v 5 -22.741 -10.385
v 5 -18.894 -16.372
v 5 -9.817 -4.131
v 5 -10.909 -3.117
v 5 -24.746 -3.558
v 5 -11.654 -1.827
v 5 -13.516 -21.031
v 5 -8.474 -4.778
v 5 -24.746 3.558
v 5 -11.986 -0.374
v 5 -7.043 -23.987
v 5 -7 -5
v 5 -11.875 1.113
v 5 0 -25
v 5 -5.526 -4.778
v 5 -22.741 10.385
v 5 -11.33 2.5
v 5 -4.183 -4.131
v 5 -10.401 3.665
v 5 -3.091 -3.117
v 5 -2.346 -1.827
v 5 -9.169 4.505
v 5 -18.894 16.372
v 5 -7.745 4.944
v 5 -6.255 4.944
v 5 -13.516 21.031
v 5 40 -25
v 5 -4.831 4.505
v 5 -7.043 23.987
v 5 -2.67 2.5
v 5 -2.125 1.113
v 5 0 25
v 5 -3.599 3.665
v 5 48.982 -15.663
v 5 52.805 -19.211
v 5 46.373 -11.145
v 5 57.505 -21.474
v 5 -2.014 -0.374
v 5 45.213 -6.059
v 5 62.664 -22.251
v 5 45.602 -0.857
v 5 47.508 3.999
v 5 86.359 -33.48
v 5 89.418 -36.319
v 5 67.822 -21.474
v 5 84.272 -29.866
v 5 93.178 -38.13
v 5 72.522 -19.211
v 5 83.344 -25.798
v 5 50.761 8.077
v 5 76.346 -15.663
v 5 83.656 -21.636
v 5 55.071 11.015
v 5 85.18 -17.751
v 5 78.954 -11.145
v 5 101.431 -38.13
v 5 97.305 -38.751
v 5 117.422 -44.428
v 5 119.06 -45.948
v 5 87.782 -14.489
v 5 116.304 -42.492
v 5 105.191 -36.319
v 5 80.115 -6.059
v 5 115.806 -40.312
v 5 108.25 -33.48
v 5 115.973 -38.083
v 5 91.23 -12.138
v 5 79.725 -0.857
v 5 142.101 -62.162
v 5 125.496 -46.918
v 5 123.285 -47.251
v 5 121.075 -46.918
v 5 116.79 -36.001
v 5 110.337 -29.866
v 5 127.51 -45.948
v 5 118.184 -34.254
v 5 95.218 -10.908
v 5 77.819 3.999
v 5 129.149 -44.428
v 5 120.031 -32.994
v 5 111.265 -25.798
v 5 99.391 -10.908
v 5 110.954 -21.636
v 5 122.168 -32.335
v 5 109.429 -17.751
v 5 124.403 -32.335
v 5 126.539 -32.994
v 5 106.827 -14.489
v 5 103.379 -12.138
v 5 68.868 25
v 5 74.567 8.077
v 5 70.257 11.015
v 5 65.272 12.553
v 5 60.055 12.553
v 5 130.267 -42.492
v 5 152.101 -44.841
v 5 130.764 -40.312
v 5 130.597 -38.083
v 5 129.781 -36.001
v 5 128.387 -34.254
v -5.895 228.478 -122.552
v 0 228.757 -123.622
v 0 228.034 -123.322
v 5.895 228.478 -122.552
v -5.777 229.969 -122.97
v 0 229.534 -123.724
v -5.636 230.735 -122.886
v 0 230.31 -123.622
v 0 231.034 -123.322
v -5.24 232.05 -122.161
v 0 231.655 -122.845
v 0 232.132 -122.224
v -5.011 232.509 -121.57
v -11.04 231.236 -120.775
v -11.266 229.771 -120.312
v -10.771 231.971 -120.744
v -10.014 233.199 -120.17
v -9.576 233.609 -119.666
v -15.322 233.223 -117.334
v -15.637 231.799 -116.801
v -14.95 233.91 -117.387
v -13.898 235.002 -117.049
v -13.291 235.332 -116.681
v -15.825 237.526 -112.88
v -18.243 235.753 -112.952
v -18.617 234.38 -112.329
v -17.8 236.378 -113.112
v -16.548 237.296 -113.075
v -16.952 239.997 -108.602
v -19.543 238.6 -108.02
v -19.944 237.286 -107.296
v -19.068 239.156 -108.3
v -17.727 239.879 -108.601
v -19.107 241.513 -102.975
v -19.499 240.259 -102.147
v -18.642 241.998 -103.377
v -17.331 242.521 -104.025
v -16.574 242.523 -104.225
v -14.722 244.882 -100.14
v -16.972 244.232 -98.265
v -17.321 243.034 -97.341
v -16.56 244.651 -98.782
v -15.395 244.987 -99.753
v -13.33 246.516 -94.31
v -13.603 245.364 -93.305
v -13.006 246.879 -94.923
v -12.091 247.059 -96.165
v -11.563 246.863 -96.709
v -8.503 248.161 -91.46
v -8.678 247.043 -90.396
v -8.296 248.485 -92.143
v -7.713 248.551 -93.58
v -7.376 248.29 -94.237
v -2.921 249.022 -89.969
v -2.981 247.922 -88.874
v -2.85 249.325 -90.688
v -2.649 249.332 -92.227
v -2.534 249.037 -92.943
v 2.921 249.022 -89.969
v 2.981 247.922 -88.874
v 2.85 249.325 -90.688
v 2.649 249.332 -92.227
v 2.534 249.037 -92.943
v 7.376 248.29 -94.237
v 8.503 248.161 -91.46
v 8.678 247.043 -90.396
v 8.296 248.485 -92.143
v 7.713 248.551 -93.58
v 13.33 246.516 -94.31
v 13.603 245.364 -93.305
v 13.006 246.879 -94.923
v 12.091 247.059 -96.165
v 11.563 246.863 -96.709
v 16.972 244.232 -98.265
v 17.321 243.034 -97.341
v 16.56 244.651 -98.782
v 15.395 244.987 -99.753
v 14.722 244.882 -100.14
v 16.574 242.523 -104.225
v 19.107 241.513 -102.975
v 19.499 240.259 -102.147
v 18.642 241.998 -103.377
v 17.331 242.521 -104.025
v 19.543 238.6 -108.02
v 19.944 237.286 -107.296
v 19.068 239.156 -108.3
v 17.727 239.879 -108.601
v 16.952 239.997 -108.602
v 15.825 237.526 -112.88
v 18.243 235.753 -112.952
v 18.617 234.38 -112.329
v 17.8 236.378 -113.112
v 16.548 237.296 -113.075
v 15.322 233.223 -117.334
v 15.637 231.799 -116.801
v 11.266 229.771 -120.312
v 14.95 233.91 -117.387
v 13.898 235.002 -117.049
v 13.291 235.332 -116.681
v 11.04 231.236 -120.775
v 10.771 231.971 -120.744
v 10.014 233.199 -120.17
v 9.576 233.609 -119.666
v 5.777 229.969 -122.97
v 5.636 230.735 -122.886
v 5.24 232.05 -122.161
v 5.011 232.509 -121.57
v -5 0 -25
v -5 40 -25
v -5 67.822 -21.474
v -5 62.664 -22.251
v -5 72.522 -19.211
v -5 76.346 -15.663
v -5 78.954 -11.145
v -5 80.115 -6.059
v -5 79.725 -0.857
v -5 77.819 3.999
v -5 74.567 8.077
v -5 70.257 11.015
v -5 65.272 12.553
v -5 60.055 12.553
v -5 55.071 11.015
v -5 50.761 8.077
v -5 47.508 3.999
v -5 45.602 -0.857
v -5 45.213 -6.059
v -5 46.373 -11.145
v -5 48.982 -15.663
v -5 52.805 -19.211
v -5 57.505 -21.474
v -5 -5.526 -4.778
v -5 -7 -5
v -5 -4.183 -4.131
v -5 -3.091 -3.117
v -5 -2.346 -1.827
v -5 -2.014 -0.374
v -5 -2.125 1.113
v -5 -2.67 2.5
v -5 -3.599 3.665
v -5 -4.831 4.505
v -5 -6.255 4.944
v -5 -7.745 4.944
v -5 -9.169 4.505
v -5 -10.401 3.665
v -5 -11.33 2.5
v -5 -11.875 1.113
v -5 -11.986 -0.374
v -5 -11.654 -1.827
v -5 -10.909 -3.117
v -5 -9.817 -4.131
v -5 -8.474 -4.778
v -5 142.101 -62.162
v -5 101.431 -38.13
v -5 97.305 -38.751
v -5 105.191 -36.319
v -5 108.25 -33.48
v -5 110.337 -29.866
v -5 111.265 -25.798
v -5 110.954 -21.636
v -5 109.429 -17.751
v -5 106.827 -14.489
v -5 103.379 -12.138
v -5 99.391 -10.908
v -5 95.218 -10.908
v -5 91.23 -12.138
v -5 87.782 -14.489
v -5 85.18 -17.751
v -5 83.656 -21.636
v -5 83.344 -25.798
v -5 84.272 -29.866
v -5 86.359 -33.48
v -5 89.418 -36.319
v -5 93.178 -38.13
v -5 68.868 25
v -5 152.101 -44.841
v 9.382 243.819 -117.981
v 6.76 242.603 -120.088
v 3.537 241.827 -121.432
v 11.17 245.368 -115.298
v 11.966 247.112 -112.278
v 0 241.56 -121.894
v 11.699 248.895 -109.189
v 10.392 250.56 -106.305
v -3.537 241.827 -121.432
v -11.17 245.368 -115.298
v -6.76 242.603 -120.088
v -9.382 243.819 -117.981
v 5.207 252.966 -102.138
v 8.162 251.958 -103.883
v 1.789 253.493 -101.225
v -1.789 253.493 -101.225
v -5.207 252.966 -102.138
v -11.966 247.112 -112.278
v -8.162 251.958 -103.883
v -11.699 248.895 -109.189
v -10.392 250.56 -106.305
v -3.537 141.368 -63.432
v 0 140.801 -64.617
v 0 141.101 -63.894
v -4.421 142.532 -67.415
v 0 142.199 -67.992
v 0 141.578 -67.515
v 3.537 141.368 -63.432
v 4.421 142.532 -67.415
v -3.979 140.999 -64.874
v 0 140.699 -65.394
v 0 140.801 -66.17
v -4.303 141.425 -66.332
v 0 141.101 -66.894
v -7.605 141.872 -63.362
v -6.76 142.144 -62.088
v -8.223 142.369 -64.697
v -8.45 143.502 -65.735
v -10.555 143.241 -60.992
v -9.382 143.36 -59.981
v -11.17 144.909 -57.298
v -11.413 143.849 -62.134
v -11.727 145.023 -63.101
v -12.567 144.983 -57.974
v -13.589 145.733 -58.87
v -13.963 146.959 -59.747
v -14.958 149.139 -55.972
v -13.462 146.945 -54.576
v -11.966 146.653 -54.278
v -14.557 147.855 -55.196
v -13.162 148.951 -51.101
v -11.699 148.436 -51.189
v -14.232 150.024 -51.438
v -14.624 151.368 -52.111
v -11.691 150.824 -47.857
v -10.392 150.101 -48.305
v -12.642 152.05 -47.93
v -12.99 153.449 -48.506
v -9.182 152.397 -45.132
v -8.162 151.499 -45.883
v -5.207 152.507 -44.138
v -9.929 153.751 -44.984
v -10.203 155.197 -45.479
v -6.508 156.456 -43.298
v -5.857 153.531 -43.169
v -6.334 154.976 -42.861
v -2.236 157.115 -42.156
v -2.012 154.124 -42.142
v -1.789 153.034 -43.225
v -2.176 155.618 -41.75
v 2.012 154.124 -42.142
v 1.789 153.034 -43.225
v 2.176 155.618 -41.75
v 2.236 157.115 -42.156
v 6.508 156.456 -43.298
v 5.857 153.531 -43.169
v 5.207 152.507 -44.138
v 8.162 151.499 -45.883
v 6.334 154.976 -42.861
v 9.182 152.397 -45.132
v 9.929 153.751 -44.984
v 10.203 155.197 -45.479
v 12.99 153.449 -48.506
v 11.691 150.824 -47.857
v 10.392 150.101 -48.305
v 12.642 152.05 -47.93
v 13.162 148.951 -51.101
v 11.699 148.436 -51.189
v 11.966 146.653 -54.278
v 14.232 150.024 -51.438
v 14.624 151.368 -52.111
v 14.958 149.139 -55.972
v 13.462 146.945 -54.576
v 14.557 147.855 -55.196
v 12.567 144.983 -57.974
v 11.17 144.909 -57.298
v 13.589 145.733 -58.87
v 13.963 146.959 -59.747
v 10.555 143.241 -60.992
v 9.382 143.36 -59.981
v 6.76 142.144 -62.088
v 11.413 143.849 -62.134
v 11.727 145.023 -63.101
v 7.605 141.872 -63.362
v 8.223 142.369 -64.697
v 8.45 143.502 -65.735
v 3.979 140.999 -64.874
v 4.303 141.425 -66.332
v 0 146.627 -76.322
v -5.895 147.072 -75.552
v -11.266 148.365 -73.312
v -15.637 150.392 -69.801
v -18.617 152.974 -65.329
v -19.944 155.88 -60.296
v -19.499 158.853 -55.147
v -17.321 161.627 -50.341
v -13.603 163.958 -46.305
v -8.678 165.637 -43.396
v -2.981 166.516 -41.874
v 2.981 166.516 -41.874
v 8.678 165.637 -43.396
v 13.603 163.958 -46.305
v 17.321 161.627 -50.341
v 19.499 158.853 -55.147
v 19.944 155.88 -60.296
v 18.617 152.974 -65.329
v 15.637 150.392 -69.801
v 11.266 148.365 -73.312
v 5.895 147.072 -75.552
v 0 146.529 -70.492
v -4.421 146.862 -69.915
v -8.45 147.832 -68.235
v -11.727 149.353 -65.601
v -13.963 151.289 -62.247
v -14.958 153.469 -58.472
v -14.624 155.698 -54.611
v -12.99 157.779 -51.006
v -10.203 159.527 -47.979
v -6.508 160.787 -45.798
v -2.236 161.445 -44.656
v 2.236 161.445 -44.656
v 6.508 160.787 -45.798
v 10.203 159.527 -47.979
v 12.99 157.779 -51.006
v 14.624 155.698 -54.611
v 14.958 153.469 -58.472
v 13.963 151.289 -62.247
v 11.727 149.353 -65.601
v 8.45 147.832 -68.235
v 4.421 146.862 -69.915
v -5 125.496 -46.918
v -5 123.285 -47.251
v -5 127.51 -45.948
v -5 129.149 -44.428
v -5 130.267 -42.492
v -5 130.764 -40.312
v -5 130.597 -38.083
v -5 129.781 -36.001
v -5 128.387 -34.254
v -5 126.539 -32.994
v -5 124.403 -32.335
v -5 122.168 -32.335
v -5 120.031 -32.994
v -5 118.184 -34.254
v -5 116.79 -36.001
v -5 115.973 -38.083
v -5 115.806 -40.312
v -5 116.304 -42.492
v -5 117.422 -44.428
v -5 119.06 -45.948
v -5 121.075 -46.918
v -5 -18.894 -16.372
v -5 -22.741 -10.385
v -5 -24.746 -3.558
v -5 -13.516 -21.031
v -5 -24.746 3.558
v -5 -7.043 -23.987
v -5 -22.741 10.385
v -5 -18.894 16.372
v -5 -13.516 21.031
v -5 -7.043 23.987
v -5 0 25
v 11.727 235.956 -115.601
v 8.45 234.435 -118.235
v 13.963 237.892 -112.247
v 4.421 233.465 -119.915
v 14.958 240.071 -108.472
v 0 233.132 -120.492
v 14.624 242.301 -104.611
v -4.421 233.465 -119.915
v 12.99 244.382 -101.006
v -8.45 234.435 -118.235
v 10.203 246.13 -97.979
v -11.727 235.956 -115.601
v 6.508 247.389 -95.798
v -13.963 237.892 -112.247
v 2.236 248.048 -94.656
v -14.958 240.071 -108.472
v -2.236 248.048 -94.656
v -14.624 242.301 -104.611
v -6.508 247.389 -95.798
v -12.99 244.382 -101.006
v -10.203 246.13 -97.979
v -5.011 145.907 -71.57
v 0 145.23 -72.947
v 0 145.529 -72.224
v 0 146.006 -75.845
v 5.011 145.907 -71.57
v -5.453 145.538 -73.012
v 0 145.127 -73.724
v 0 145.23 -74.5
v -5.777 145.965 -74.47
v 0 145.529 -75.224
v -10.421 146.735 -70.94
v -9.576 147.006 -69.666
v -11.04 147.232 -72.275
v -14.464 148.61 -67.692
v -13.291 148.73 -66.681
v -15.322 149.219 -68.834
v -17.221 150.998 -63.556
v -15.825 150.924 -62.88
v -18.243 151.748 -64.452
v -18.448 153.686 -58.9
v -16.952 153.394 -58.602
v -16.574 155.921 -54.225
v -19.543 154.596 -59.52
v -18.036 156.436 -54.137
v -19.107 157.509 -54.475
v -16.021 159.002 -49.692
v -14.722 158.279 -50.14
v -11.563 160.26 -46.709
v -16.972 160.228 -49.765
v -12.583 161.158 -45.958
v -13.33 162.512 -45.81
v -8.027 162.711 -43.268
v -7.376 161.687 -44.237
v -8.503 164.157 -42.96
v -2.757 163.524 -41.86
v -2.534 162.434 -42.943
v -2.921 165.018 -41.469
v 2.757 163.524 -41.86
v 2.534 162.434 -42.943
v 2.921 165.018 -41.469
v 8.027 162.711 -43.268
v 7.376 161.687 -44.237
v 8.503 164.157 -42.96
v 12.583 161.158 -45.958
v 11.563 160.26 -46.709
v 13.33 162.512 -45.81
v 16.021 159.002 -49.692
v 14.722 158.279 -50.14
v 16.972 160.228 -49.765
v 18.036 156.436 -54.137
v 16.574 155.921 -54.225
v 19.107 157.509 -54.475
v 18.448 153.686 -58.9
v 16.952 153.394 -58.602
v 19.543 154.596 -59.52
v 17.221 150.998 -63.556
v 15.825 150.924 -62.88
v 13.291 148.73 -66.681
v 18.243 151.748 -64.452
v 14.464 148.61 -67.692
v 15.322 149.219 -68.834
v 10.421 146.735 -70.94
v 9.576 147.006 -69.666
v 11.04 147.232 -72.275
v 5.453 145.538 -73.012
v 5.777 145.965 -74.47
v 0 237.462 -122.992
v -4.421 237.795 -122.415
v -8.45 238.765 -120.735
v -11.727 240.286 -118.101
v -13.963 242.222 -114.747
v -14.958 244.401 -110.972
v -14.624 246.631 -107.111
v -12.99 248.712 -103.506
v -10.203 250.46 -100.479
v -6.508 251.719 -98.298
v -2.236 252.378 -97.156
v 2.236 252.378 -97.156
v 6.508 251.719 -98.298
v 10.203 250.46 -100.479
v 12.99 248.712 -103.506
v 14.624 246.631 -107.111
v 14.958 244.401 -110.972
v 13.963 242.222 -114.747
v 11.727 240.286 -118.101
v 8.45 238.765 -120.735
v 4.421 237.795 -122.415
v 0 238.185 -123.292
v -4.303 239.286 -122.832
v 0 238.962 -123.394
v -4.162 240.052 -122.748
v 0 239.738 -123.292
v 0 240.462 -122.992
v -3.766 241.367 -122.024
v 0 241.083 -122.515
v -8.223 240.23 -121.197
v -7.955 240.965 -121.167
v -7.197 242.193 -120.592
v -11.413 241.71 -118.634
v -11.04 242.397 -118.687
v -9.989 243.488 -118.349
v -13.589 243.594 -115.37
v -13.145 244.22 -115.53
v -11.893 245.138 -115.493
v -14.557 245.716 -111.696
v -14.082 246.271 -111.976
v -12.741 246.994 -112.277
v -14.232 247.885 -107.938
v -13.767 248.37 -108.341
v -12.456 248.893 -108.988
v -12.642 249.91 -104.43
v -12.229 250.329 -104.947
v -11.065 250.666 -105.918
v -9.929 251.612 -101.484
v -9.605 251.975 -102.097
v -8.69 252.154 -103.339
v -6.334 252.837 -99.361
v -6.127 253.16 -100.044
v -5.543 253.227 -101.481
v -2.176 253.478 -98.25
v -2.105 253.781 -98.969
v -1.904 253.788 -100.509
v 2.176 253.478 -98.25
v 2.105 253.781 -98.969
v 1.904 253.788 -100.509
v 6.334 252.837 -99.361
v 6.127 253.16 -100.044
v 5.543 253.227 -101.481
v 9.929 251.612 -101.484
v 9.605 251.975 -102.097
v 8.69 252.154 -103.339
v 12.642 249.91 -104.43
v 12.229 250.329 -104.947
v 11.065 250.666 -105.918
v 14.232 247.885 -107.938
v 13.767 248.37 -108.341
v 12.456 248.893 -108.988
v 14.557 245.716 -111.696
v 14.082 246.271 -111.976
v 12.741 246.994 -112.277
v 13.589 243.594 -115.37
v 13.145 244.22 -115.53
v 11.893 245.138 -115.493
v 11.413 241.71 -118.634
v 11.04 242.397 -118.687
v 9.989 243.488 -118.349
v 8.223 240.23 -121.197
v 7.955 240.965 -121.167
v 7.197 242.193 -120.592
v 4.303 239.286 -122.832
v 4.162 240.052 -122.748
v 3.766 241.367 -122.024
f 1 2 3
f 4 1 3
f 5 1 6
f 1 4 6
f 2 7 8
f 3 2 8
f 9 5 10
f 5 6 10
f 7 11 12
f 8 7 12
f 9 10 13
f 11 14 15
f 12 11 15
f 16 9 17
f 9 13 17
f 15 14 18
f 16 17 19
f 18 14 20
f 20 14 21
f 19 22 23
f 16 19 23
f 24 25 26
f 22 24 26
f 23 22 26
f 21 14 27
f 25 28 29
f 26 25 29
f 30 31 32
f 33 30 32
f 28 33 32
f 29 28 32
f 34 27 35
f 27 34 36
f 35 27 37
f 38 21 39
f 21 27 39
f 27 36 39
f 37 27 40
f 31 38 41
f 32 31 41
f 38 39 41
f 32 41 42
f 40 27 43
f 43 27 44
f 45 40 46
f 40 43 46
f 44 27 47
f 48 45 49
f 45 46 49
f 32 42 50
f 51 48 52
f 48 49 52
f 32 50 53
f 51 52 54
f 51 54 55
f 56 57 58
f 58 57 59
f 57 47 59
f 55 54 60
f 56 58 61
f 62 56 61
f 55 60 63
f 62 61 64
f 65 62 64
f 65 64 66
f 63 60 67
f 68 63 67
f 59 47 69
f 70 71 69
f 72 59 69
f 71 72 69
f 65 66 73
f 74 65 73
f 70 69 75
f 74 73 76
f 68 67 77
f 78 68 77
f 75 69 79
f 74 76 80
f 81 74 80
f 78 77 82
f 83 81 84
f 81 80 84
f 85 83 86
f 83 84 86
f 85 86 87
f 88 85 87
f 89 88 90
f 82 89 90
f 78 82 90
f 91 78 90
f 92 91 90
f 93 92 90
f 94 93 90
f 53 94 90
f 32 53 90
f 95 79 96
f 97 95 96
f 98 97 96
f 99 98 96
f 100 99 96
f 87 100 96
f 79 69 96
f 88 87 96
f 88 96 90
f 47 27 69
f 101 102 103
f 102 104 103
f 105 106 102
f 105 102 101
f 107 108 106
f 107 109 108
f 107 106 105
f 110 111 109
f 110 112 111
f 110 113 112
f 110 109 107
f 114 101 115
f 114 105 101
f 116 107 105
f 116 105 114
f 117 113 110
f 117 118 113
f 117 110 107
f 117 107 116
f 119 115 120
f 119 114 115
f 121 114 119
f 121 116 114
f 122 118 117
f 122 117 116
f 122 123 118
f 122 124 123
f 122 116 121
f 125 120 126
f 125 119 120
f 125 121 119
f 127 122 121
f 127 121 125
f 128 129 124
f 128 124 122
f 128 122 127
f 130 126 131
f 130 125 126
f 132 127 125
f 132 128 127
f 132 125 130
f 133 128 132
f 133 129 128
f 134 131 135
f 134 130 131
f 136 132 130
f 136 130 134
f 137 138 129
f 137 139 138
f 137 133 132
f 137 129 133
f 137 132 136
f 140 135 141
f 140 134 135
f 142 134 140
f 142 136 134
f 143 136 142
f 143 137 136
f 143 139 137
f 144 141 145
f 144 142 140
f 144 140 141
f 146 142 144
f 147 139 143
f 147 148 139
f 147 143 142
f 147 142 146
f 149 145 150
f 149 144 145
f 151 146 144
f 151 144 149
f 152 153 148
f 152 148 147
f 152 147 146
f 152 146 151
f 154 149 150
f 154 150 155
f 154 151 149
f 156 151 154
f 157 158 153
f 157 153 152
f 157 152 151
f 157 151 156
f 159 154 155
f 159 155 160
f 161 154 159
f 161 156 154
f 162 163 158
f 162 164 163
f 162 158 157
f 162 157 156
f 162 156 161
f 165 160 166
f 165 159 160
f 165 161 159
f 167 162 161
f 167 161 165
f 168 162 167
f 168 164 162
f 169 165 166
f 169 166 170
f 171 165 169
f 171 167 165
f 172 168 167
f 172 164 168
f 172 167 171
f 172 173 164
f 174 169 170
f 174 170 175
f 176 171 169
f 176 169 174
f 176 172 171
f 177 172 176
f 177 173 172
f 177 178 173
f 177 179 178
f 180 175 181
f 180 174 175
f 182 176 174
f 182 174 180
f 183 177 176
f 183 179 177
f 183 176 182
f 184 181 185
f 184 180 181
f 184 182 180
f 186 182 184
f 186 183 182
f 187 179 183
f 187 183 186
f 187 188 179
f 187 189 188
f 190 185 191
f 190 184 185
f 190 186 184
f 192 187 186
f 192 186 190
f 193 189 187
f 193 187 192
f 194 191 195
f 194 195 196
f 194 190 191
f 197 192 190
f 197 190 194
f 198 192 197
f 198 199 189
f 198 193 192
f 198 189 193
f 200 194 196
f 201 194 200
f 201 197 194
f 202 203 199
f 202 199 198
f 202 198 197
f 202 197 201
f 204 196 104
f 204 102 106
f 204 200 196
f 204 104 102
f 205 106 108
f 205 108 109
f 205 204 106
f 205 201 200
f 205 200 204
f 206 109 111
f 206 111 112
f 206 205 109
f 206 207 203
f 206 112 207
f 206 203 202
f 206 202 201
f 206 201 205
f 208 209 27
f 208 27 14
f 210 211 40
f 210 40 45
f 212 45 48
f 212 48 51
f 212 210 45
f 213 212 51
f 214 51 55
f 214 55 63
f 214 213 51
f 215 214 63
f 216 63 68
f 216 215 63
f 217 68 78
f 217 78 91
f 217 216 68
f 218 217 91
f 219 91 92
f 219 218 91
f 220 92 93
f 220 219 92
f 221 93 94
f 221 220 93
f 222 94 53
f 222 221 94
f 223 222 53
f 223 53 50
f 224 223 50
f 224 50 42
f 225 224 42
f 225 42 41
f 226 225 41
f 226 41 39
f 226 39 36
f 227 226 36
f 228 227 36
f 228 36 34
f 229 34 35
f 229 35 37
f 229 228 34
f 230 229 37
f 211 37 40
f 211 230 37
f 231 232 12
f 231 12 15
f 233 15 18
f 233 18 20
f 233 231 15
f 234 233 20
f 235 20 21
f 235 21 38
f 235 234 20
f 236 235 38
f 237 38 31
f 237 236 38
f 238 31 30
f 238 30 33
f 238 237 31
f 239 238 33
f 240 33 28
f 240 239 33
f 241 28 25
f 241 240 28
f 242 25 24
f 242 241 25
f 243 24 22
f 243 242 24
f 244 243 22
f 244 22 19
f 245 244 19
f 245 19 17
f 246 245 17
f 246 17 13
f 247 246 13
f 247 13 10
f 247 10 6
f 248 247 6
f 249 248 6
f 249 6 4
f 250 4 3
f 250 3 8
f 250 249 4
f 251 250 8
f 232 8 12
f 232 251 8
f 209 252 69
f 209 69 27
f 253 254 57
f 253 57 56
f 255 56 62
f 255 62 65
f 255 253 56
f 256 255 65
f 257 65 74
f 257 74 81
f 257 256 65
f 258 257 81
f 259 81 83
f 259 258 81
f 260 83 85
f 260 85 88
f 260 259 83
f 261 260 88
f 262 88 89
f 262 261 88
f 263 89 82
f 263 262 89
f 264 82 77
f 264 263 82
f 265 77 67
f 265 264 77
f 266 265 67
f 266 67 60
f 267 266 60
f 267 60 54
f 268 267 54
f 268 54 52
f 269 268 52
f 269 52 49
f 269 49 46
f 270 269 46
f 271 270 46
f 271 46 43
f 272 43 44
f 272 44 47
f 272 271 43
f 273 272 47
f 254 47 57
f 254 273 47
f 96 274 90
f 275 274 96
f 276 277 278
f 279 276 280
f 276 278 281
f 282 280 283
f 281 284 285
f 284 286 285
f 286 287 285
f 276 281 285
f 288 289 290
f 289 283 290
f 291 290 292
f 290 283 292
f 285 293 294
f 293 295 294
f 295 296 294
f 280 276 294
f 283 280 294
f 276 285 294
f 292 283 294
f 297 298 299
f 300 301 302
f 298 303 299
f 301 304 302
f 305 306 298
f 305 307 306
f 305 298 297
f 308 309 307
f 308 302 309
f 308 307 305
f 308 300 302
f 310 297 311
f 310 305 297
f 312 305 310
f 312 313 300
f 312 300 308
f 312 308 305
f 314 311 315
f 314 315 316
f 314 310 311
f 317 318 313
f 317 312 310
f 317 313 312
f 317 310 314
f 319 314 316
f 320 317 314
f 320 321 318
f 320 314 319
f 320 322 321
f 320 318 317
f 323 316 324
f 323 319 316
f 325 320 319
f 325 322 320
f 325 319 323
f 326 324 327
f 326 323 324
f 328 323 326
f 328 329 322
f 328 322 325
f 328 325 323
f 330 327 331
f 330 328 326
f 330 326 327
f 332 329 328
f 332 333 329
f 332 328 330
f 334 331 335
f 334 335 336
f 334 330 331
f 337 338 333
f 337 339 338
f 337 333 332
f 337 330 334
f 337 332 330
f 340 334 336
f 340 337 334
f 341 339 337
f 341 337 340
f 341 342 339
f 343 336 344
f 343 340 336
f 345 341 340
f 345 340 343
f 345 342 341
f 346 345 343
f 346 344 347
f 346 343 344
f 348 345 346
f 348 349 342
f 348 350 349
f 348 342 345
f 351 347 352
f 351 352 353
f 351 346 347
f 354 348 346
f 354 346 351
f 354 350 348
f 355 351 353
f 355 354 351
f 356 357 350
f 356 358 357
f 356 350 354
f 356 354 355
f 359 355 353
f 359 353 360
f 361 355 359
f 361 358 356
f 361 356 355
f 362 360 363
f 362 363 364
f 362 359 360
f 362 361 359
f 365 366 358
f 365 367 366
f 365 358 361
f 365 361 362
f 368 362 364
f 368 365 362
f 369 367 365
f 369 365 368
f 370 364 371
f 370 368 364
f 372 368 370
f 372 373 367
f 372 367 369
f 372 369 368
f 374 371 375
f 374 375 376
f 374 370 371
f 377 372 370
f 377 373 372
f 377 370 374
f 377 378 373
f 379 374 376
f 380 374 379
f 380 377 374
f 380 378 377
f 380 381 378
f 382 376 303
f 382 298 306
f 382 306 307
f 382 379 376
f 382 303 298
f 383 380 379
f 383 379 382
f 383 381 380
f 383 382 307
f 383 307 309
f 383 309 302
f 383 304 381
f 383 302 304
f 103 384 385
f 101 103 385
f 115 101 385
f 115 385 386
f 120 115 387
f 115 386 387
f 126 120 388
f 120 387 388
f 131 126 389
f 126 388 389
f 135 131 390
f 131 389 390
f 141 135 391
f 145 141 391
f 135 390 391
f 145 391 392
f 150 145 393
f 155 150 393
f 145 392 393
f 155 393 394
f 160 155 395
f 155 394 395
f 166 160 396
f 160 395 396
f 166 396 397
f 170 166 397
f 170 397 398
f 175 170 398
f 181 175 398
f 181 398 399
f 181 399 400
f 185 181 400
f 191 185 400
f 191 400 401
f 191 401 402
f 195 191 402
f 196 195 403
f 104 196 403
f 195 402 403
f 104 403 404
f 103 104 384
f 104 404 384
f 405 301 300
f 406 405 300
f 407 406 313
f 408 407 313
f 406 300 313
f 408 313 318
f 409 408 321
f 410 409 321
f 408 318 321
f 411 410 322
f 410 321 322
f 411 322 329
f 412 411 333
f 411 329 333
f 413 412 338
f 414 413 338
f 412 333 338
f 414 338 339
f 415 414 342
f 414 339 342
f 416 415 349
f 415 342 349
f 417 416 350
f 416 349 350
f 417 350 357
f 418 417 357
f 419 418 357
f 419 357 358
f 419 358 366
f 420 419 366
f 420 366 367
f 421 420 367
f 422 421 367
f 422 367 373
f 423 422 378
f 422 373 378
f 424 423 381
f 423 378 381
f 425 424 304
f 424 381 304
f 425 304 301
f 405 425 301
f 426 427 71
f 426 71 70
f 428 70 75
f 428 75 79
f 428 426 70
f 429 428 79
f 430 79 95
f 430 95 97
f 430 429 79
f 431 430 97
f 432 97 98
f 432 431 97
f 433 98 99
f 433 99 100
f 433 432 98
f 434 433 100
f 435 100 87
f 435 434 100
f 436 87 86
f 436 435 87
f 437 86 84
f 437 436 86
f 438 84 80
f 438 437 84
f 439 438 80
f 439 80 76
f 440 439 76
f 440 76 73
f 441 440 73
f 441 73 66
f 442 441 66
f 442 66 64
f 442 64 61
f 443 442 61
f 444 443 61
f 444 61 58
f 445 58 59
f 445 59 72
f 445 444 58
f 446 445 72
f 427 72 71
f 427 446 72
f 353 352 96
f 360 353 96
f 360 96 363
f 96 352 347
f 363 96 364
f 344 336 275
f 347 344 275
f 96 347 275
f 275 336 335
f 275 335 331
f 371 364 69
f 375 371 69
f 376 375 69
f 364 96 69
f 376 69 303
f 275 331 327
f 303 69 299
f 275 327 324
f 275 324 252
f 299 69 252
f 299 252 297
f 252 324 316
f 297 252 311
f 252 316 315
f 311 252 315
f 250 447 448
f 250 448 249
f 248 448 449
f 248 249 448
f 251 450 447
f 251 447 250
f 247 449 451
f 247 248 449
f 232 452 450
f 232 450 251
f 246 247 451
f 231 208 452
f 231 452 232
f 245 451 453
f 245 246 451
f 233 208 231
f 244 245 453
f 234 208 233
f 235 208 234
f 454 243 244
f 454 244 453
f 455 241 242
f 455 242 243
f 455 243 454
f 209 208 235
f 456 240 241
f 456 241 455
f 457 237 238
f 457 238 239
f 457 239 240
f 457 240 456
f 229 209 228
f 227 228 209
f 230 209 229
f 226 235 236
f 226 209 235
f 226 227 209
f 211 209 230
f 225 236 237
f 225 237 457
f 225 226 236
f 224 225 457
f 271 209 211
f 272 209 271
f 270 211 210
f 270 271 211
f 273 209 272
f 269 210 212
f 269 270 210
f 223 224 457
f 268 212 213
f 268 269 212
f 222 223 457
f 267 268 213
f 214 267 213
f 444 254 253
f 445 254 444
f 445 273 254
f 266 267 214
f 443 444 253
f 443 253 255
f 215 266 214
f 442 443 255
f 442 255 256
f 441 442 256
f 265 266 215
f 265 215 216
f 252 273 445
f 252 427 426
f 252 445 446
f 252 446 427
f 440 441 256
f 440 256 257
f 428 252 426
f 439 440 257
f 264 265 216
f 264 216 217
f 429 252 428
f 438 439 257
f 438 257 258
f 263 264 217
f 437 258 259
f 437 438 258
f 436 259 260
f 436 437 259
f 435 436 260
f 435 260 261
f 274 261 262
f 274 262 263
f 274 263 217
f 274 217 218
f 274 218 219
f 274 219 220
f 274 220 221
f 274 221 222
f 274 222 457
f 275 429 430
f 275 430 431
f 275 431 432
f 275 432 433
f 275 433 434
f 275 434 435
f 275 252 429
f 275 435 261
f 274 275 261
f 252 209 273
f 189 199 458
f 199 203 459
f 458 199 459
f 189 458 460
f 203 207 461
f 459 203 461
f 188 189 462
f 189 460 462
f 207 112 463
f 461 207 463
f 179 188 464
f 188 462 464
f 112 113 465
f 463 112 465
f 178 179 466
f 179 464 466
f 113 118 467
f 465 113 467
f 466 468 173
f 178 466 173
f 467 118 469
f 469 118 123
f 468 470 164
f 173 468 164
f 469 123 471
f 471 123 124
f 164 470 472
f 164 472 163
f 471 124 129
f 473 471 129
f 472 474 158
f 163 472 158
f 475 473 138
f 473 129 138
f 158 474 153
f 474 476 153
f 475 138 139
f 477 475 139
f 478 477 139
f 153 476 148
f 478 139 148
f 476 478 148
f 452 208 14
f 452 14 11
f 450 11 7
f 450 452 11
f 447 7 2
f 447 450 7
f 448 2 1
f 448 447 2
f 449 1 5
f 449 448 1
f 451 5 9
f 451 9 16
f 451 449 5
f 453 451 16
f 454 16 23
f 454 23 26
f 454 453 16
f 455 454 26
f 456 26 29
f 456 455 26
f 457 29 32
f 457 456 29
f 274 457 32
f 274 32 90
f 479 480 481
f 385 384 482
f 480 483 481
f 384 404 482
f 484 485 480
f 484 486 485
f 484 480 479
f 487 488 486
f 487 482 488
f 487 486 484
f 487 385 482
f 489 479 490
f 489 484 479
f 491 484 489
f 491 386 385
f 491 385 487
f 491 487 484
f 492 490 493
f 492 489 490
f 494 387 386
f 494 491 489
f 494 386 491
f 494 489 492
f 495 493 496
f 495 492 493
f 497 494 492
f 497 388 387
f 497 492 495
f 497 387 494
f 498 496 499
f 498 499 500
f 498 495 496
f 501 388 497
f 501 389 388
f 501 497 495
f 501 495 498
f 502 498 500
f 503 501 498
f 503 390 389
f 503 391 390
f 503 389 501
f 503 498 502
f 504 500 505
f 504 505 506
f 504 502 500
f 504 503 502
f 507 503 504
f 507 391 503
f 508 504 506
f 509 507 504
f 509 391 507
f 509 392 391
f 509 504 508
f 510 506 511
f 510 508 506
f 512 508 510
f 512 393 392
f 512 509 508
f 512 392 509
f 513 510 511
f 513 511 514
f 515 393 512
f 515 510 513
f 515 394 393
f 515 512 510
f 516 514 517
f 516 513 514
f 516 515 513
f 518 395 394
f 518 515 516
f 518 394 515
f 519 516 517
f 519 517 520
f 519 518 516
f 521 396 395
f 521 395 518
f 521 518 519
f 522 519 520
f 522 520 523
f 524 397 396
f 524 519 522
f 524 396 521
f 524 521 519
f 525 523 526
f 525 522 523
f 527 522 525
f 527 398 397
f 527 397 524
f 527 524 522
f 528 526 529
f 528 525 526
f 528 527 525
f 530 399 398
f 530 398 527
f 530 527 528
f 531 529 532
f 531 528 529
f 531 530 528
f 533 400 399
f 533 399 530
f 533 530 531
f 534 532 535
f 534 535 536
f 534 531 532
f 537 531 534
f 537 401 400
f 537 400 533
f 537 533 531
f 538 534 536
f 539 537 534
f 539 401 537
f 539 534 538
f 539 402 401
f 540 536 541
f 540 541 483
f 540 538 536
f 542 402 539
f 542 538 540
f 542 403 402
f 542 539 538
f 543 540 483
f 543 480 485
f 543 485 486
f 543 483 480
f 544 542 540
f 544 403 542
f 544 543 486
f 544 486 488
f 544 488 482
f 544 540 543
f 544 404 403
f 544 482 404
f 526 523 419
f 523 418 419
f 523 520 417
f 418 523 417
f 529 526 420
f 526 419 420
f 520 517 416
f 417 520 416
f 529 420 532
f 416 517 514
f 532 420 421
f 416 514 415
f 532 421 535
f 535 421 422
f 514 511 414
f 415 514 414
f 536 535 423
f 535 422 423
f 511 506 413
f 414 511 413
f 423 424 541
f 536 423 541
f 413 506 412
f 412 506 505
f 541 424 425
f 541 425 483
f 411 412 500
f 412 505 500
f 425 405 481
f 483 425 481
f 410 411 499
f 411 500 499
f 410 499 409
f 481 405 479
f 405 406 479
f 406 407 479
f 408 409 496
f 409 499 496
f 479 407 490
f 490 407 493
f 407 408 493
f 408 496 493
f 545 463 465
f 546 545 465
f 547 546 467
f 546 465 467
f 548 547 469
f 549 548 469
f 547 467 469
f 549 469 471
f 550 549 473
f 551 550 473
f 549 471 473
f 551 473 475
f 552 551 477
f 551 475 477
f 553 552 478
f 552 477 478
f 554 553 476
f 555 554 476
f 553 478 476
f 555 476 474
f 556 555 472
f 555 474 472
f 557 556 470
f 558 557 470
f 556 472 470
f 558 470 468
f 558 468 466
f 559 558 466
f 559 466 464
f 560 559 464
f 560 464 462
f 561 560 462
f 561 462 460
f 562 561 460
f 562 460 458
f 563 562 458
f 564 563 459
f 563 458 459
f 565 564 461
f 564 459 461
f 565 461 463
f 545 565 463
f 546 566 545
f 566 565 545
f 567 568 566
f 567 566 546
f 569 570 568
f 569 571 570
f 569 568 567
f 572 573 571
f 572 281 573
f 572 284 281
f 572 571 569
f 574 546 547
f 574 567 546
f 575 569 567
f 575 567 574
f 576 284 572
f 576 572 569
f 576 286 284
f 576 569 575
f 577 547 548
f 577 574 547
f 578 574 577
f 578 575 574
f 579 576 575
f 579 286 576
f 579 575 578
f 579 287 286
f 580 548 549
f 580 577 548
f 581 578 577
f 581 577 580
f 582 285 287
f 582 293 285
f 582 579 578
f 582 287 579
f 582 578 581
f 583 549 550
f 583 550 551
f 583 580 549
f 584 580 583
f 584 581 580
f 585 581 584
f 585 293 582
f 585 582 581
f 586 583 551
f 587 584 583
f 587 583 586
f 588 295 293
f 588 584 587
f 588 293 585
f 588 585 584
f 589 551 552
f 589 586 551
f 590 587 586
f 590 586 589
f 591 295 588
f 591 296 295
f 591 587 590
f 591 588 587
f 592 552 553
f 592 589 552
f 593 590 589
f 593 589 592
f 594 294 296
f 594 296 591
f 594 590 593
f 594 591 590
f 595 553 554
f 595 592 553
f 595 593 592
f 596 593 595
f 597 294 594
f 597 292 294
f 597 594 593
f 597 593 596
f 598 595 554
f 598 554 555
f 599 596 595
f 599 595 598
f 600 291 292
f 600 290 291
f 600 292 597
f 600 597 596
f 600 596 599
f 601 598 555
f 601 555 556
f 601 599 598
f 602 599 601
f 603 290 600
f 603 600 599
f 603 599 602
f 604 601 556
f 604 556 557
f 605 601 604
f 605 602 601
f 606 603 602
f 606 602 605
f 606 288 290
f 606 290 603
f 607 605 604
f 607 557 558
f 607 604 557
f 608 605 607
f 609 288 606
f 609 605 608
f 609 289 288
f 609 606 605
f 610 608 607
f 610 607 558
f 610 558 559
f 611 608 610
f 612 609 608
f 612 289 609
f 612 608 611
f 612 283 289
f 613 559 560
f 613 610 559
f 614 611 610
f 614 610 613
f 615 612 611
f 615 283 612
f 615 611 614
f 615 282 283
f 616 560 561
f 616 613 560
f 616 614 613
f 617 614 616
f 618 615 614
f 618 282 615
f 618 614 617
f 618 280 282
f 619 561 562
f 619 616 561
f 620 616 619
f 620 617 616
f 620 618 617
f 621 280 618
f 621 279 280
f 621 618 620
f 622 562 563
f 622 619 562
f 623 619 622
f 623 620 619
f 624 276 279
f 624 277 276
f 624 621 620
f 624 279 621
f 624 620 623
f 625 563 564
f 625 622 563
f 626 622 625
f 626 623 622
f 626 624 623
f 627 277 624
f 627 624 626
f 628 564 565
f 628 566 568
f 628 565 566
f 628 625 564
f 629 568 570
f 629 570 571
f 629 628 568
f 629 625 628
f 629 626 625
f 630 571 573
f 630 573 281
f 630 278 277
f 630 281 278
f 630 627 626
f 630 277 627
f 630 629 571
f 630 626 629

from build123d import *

# Parameters (mm, degrees)
DODANIE_WYCI_GNI_CIE1_DEPTH      = 5
DODANIE_WYCI_GNI_CIE1_DEPTH_BACK = 5
SZKIC1_R                         = 7.5
SZKIC1_R_2                       = 14
SZKIC1_R_3                       = 17.5
SZKIC1_R_4                       = 5
ZAOKR_GLENIE1_R                  = 3
ZAOKR_GLENIE2_R                  = 3


with BuildPart() as part:
    # Szkic1 → Dodanie-wyciągnięcie1 (new, two sides: drawn at the far end of the back side and taken through both)
    with BuildSketch(Plane(origin=(0, 0, 0), x_dir=(0, 0, -1), z_dir=(1, 0, 0)).offset(-DODANIE_WYCI_GNI_CIE1_DEPTH_BACK)):
        with BuildLine():
            Line((-25, 0), (-25, 68.867513459))
            Line((-25, 68.867513459), (44.841238994, 152.101060942))
            Line((44.841238994, 152.101060942), (62.16174707, 142.101060942))
            Line((62.16174707, 142.101060942), (25, 40))
            Line((25, 40), (25, 0))
            ThreePointArc((25, 0), (0, -25), (-25, 0))
        make_face()
        with Locations((39.751493032, 123.285362338)):
            Circle(SZKIC1_R, mode=Mode.SUBTRACT)
        with Locations((24.751493032, 97.304600224)):
            Circle(SZKIC1_R_2, mode=Mode.SUBTRACT)
        with Locations((4.751493032, 62.663584073)):
            Circle(SZKIC1_R_3, mode=Mode.SUBTRACT)
        with Locations((0, -7)):
            Circle(SZKIC1_R_4, mode=Mode.SUBTRACT)
    extrude(amount=DODANIE_WYCI_GNI_CIE1_DEPTH + DODANIE_WYCI_GNI_CIE1_DEPTH_BACK)

    # Szkic3 → Obrót1 (revolve)
    with BuildSketch(Plane(origin=(0, 0, 0), x_dir=(0, 0, -1), z_dir=(1, 0, 0))):
        Polygon((40.511111975, 154.601060942), (53.501493032, 147.101060942), (111.501493032, 247.560007781), (98.511111975, 255.060007781), (94.511111975, 248.131804551), (90.180984956, 250.631804551), (40.180984956, 164.029264172), (44.511111975, 161.529264172), align=None)
    revolve(axis=Axis((0, 147.101060942, -53.501493032), (0, 0.8660254037844385, -0.5000000000000003)))

    # Zaokrąglenie1
    zaokr_glenie1_edges = [part.edges().sort_by_distance(p)[0] for p in [
        (0, 240.060007781, -124.491874089),
        (0, 139.601060942, -66.491874089),
    ]]
    fillet(zaokr_glenie1_edges, radius=ZAOKR_GLENIE1_R)

    # Zaokrąglenie2
    zaokr_glenie2_edges = [part.edges().sort_by_distance(p)[0] for p in [
        (0, 144.029264172, -74.822001108),
        (0, 230.631804551, -124.822001108),
    ]]
    fillet(zaokr_glenie2_edges, radius=ZAOKR_GLENIE2_R)


solid = part.part
